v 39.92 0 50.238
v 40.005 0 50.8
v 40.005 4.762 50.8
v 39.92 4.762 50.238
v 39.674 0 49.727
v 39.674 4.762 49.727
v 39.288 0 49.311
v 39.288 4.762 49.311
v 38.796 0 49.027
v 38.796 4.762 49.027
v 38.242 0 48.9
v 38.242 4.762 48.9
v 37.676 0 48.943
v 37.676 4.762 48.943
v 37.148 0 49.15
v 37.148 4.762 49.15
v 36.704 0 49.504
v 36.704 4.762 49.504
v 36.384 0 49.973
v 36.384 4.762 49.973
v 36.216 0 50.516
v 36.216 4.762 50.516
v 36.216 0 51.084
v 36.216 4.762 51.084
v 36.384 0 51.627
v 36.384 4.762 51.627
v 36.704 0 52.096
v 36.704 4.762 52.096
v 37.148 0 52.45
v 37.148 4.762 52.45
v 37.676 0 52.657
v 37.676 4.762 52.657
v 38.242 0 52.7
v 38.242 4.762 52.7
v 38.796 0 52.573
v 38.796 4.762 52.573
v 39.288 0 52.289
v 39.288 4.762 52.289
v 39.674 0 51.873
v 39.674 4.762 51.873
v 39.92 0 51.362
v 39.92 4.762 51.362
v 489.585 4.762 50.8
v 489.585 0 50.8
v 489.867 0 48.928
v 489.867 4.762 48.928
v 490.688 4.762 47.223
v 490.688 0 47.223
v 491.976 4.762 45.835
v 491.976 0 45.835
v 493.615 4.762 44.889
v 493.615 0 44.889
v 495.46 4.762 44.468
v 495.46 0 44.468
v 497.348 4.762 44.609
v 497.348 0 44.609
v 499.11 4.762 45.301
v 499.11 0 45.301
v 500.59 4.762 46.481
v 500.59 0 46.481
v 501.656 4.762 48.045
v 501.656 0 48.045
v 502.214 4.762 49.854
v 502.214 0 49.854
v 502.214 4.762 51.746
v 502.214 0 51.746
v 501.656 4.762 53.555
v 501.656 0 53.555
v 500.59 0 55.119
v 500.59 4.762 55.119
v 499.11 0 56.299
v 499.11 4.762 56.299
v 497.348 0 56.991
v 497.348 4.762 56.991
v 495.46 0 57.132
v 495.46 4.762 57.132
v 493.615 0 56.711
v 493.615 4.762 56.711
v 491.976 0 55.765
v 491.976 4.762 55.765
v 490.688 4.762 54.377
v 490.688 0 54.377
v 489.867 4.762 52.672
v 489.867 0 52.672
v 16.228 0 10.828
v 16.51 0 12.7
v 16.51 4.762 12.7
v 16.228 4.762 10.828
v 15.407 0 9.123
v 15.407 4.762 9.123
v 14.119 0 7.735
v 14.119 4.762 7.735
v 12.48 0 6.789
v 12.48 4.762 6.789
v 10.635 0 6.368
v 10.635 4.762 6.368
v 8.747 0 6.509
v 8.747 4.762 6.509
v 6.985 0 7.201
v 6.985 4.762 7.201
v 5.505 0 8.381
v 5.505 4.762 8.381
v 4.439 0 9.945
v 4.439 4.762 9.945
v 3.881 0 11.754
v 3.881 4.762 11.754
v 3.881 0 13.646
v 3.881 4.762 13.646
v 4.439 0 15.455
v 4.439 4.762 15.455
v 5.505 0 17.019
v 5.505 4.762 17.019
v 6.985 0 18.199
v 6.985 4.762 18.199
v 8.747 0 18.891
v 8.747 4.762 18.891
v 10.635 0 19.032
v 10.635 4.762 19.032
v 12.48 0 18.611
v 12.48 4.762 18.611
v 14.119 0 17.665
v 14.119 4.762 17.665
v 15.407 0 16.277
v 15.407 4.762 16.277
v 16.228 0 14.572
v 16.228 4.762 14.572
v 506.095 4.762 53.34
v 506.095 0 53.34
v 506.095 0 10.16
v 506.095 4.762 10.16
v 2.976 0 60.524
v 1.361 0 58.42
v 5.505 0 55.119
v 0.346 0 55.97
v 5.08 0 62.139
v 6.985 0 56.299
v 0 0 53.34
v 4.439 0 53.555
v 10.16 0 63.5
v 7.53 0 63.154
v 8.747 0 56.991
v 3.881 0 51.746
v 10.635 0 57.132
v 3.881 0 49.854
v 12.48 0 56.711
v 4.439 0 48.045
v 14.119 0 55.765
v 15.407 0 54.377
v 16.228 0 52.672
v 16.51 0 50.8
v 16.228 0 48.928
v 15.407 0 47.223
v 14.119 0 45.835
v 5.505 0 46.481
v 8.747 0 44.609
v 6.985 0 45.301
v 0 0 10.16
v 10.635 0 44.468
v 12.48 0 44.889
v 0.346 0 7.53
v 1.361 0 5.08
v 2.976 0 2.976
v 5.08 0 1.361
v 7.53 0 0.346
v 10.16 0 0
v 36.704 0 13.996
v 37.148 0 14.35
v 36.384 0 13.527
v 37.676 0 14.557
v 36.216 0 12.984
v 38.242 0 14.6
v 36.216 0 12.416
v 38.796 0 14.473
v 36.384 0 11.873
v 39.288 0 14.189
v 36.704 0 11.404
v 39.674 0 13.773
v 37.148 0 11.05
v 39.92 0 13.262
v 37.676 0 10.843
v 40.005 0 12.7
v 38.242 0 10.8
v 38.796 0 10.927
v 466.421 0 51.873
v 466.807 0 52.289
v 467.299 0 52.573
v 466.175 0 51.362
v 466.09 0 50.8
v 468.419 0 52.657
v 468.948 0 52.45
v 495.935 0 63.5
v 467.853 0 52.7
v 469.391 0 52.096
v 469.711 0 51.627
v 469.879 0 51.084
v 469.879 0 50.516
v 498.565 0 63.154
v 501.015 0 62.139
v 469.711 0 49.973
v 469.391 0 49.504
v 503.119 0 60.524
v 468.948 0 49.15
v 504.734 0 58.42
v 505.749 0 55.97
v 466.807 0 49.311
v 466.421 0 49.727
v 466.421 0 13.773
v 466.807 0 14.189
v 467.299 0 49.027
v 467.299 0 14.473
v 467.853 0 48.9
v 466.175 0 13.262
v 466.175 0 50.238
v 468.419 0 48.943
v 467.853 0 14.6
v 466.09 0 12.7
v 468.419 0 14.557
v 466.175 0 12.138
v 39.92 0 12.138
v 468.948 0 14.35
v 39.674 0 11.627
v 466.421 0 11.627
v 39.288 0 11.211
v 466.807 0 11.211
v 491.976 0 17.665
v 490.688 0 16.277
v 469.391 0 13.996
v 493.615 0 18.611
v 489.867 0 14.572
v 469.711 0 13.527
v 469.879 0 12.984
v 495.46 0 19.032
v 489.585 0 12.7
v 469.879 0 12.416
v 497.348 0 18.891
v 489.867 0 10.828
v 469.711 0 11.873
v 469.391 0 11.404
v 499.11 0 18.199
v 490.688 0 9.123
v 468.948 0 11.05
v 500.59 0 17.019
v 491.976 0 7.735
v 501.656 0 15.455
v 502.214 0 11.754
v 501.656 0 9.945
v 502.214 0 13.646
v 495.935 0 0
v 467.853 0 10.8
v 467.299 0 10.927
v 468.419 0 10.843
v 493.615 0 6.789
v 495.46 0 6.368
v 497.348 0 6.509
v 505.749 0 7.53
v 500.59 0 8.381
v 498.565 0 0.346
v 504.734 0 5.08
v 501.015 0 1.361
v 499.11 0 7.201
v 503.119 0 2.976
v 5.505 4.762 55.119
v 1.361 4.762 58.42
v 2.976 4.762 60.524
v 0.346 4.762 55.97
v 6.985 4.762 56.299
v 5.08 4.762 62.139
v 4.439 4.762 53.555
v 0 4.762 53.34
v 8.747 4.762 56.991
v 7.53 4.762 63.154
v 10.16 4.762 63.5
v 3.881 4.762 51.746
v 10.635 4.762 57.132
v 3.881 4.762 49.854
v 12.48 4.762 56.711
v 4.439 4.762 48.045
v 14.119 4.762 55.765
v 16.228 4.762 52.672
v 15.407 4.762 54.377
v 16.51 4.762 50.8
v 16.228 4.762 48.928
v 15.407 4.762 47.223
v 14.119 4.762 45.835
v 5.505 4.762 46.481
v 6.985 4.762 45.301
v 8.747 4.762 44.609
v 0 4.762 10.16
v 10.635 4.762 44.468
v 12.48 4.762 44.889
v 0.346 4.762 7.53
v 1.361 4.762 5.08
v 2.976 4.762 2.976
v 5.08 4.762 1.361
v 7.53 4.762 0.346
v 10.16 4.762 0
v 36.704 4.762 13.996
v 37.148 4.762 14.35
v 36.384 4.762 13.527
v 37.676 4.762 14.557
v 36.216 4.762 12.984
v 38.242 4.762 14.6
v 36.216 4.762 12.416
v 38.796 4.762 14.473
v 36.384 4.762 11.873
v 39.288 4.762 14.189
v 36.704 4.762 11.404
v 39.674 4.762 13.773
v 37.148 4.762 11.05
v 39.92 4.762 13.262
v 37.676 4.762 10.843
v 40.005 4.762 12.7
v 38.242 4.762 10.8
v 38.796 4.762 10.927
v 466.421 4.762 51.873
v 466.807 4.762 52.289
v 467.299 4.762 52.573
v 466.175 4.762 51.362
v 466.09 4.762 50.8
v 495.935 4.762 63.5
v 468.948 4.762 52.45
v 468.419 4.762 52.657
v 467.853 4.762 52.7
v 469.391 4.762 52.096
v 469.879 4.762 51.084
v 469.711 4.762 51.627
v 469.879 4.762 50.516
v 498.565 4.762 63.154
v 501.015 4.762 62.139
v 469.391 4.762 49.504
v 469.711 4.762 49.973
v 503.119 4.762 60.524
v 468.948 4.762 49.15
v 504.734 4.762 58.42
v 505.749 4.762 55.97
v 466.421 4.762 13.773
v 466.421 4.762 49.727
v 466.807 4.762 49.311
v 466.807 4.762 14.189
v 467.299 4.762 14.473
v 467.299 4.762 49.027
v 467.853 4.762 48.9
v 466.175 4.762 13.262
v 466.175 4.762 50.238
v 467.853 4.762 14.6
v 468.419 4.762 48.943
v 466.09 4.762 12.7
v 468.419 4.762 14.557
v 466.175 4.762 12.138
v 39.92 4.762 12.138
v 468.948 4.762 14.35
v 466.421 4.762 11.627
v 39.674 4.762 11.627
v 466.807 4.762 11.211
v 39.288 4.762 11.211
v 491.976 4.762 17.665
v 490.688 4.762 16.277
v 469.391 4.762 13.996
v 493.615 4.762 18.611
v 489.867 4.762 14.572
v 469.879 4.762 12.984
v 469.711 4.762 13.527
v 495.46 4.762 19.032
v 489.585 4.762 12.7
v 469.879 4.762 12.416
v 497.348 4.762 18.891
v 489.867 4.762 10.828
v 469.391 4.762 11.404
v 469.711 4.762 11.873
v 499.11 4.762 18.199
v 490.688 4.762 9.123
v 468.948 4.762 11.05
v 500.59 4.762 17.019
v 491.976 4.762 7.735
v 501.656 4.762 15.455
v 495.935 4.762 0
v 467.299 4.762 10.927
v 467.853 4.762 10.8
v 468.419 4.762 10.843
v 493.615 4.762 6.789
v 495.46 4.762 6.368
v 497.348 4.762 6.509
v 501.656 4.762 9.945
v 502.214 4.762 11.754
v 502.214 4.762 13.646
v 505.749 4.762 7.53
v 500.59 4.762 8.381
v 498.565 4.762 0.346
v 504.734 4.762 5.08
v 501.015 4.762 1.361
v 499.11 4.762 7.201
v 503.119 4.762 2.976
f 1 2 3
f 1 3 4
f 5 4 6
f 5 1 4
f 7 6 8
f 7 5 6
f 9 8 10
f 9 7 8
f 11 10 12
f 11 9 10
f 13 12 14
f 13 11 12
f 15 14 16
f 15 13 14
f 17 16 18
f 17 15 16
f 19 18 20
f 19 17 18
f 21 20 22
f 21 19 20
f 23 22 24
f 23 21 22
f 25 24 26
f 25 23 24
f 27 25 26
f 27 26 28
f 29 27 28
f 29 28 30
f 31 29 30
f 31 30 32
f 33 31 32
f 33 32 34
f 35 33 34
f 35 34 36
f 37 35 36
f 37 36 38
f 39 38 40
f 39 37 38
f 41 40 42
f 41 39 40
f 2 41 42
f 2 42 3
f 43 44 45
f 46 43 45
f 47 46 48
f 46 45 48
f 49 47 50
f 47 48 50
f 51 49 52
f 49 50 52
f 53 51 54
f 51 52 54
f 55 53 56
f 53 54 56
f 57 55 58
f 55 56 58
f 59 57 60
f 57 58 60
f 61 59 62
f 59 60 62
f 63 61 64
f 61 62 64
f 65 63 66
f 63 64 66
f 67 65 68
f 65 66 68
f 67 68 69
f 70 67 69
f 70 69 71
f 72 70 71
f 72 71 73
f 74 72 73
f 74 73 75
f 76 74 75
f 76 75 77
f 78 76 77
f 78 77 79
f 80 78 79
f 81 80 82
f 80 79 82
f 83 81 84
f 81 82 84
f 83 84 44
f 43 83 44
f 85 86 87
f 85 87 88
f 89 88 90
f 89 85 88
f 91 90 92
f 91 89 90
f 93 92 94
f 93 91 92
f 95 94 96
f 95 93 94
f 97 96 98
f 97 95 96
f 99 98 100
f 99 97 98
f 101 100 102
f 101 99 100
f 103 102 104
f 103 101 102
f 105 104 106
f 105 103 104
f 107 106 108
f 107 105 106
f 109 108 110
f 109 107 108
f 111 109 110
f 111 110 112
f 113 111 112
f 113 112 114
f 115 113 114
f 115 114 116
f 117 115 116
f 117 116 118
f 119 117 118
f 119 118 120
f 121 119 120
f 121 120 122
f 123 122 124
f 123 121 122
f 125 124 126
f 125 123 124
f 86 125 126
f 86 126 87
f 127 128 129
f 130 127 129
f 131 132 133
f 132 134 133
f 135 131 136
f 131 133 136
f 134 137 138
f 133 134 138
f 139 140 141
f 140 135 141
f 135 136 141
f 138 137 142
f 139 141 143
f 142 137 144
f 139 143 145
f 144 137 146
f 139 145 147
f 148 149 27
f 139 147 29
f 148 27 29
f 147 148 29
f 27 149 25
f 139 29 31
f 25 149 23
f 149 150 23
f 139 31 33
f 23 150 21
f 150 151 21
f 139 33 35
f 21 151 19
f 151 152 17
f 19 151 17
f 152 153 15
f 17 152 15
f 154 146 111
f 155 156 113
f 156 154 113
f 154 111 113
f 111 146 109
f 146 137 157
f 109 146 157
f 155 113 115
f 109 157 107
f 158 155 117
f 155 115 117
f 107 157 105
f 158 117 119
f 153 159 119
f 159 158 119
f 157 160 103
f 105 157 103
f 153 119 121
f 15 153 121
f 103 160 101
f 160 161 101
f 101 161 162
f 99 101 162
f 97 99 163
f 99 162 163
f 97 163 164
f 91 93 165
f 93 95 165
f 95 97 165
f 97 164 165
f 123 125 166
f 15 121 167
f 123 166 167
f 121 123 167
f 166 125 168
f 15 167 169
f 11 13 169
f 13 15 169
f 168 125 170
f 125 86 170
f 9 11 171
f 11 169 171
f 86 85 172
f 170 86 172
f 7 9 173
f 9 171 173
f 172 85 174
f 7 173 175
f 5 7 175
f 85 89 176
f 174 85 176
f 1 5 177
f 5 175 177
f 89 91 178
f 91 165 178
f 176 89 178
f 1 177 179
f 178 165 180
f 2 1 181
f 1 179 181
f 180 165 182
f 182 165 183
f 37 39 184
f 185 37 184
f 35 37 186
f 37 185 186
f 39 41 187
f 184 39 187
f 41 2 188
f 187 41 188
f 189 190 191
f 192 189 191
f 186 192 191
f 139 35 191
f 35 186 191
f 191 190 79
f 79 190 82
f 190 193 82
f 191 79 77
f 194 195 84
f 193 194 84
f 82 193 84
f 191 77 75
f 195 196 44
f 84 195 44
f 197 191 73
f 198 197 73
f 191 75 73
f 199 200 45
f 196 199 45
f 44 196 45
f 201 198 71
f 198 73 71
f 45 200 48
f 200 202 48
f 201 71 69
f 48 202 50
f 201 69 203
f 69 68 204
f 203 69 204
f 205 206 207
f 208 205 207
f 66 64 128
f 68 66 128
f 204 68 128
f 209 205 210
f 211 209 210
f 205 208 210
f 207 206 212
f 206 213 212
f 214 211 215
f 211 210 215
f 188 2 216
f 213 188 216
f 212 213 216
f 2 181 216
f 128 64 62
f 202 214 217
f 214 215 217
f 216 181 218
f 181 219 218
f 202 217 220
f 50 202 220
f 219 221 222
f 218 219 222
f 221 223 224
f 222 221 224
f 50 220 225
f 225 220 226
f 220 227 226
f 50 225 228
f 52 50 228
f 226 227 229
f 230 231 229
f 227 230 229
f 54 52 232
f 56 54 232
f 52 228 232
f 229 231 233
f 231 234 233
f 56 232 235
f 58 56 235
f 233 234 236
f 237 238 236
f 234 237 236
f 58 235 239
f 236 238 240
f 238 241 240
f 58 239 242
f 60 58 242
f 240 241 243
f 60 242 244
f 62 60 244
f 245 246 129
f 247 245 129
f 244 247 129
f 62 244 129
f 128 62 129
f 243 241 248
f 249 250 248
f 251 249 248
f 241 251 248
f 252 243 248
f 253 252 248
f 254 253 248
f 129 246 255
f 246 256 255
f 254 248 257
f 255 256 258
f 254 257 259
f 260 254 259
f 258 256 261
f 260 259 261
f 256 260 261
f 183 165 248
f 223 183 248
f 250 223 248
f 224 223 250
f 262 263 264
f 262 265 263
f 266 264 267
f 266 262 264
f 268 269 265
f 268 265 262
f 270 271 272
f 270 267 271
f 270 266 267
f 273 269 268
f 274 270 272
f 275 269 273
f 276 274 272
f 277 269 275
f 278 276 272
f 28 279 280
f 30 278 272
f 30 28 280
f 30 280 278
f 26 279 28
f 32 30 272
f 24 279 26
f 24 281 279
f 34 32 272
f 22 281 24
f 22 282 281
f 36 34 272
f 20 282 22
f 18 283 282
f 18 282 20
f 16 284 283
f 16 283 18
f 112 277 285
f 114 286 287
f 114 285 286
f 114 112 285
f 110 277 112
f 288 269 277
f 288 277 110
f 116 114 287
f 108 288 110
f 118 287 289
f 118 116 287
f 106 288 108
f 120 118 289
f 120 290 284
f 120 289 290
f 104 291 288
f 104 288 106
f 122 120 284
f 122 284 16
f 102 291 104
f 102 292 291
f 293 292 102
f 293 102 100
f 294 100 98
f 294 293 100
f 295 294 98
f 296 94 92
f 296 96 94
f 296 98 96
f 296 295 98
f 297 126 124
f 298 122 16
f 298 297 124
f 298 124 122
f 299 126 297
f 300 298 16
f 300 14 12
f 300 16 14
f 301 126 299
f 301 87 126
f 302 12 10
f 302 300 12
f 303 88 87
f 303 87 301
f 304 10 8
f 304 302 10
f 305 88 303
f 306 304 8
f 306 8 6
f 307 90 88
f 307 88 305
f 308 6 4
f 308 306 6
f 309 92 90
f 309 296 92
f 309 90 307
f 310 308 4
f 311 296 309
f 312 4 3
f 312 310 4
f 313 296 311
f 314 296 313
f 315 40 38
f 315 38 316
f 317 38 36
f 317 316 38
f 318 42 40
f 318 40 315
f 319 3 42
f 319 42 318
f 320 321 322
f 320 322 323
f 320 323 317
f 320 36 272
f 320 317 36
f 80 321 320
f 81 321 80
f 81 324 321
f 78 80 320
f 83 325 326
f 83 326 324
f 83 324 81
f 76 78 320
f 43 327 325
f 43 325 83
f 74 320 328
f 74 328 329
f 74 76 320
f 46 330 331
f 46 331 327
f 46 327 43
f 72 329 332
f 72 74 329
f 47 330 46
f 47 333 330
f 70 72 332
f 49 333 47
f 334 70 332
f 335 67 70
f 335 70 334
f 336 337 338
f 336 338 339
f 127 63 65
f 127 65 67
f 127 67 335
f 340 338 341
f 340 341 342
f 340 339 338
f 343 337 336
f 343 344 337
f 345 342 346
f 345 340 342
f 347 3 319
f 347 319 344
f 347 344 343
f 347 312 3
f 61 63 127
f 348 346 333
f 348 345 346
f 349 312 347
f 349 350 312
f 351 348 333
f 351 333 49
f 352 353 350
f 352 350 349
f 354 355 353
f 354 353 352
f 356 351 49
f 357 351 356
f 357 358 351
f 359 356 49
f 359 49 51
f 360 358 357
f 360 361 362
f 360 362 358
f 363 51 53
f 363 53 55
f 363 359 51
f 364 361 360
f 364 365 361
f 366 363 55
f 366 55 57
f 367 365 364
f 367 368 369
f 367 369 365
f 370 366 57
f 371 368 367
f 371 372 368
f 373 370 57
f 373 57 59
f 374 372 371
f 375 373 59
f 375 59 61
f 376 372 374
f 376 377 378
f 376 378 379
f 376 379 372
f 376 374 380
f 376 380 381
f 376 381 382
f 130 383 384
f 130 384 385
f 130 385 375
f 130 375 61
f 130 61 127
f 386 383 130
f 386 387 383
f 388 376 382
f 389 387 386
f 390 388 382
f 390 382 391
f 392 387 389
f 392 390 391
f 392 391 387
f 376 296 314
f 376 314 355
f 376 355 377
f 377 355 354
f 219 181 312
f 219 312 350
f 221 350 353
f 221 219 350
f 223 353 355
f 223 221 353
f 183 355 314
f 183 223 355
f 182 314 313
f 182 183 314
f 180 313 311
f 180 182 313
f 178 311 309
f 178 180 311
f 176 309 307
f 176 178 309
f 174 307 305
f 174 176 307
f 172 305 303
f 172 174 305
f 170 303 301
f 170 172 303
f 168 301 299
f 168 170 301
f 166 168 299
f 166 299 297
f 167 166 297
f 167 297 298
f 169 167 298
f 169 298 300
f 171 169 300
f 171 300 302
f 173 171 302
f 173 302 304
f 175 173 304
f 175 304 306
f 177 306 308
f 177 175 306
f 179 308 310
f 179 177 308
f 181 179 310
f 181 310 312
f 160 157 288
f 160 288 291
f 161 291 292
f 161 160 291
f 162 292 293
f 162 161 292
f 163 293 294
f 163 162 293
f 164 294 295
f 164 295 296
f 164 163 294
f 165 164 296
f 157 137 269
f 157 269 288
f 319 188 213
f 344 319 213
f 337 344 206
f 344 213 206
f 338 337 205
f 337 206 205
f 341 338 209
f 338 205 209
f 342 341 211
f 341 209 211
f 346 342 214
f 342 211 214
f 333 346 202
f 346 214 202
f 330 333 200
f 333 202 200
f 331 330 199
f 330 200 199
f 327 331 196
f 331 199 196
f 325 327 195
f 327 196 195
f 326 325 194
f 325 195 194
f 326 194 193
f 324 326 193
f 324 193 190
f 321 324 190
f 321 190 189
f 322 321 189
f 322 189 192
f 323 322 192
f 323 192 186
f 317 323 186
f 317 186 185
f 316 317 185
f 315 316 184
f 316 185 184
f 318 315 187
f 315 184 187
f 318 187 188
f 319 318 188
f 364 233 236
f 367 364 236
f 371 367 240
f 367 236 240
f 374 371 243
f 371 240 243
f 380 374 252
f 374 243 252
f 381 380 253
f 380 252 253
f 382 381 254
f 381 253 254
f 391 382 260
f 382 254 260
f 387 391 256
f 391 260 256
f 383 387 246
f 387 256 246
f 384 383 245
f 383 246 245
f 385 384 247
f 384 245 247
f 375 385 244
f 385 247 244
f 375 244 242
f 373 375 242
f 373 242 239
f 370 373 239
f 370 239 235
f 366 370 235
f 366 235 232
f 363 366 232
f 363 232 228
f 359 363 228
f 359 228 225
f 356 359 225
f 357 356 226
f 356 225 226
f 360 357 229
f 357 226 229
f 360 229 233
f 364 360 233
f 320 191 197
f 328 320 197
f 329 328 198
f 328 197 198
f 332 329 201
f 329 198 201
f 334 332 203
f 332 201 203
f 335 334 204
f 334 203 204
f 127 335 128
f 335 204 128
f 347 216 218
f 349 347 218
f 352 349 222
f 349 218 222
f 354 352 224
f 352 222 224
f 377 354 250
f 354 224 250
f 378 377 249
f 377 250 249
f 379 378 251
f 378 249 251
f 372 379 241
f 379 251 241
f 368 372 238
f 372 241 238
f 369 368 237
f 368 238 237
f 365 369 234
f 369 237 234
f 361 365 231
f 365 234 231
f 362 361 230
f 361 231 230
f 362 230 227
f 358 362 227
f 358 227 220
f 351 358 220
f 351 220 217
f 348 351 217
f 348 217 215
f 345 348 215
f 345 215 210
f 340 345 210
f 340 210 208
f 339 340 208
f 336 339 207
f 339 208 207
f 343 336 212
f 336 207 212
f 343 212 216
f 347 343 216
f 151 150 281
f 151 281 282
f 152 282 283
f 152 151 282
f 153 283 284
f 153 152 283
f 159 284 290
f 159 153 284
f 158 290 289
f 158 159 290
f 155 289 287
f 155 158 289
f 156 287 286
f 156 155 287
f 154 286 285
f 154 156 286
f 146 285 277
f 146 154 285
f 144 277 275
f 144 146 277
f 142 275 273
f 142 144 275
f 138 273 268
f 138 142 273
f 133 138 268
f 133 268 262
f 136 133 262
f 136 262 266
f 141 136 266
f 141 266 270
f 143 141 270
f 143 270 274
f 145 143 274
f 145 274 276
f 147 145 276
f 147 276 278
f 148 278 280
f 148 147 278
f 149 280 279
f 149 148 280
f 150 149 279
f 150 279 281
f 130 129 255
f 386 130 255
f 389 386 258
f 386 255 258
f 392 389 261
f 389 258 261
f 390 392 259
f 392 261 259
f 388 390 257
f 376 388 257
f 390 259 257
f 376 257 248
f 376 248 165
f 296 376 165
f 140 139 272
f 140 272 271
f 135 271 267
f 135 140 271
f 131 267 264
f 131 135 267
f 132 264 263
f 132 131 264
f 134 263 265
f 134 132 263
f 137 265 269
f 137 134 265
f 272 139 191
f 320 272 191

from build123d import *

# Parameters (mm, degrees)
SKETCH1_R           = 6.35
SKETCH1_R_2         = 1.905
BOSS_EXTRUDE1_DEPTH = 4.7625


with BuildPart() as part:
    # Sketch1 → Boss-Extrude1 (new body)
    with BuildSketch(Plane(origin=(0, 0, 0), x_dir=(1, 0, 0), z_dir=(0, 1, 0))):
        with BuildLine():
            Line((10.16, 0), (253.0475, 0))
            Line((253.0475, 0), (253.0475, -63.5))
            Line((253.0475, -63.5), (10.16, -63.5))
            ThreePointArc((10.16, -63.5), (2.975795103, -60.524204897), (0, -53.34))
            Line((0, -53.34), (0, -43.815))
            Line((0, -43.815), (0, -26.035))
            Line((0, -26.035), (0, -10.16))
            ThreePointArc((0, -10.16), (2.975795103, -2.975795103), (10.16, 0))
        make_face()
        with Locations((10.16, -50.8)):
            Circle(SKETCH1_R, mode=Mode.SUBTRACT)
        with Locations((10.16, -12.7)):
            Circle(SKETCH1_R, mode=Mode.SUBTRACT)
        with Locations((38.1, -50.8)):
            Circle(SKETCH1_R_2, mode=Mode.SUBTRACT)
        with Locations((38.1, -12.7)):
            Circle(SKETCH1_R_2, mode=Mode.SUBTRACT)
    boss_extrude1 = extrude(amount=BOSS_EXTRUDE1_DEPTH)

    # Mirror1: Boss-Extrude1 across plane
    add(boss_extrude1.mirror(Plane(origin=(253.0475, 4.7625, 0), x_dir=(0, 0, 1), z_dir=(-1, 0, 0))))


solid = part.part
